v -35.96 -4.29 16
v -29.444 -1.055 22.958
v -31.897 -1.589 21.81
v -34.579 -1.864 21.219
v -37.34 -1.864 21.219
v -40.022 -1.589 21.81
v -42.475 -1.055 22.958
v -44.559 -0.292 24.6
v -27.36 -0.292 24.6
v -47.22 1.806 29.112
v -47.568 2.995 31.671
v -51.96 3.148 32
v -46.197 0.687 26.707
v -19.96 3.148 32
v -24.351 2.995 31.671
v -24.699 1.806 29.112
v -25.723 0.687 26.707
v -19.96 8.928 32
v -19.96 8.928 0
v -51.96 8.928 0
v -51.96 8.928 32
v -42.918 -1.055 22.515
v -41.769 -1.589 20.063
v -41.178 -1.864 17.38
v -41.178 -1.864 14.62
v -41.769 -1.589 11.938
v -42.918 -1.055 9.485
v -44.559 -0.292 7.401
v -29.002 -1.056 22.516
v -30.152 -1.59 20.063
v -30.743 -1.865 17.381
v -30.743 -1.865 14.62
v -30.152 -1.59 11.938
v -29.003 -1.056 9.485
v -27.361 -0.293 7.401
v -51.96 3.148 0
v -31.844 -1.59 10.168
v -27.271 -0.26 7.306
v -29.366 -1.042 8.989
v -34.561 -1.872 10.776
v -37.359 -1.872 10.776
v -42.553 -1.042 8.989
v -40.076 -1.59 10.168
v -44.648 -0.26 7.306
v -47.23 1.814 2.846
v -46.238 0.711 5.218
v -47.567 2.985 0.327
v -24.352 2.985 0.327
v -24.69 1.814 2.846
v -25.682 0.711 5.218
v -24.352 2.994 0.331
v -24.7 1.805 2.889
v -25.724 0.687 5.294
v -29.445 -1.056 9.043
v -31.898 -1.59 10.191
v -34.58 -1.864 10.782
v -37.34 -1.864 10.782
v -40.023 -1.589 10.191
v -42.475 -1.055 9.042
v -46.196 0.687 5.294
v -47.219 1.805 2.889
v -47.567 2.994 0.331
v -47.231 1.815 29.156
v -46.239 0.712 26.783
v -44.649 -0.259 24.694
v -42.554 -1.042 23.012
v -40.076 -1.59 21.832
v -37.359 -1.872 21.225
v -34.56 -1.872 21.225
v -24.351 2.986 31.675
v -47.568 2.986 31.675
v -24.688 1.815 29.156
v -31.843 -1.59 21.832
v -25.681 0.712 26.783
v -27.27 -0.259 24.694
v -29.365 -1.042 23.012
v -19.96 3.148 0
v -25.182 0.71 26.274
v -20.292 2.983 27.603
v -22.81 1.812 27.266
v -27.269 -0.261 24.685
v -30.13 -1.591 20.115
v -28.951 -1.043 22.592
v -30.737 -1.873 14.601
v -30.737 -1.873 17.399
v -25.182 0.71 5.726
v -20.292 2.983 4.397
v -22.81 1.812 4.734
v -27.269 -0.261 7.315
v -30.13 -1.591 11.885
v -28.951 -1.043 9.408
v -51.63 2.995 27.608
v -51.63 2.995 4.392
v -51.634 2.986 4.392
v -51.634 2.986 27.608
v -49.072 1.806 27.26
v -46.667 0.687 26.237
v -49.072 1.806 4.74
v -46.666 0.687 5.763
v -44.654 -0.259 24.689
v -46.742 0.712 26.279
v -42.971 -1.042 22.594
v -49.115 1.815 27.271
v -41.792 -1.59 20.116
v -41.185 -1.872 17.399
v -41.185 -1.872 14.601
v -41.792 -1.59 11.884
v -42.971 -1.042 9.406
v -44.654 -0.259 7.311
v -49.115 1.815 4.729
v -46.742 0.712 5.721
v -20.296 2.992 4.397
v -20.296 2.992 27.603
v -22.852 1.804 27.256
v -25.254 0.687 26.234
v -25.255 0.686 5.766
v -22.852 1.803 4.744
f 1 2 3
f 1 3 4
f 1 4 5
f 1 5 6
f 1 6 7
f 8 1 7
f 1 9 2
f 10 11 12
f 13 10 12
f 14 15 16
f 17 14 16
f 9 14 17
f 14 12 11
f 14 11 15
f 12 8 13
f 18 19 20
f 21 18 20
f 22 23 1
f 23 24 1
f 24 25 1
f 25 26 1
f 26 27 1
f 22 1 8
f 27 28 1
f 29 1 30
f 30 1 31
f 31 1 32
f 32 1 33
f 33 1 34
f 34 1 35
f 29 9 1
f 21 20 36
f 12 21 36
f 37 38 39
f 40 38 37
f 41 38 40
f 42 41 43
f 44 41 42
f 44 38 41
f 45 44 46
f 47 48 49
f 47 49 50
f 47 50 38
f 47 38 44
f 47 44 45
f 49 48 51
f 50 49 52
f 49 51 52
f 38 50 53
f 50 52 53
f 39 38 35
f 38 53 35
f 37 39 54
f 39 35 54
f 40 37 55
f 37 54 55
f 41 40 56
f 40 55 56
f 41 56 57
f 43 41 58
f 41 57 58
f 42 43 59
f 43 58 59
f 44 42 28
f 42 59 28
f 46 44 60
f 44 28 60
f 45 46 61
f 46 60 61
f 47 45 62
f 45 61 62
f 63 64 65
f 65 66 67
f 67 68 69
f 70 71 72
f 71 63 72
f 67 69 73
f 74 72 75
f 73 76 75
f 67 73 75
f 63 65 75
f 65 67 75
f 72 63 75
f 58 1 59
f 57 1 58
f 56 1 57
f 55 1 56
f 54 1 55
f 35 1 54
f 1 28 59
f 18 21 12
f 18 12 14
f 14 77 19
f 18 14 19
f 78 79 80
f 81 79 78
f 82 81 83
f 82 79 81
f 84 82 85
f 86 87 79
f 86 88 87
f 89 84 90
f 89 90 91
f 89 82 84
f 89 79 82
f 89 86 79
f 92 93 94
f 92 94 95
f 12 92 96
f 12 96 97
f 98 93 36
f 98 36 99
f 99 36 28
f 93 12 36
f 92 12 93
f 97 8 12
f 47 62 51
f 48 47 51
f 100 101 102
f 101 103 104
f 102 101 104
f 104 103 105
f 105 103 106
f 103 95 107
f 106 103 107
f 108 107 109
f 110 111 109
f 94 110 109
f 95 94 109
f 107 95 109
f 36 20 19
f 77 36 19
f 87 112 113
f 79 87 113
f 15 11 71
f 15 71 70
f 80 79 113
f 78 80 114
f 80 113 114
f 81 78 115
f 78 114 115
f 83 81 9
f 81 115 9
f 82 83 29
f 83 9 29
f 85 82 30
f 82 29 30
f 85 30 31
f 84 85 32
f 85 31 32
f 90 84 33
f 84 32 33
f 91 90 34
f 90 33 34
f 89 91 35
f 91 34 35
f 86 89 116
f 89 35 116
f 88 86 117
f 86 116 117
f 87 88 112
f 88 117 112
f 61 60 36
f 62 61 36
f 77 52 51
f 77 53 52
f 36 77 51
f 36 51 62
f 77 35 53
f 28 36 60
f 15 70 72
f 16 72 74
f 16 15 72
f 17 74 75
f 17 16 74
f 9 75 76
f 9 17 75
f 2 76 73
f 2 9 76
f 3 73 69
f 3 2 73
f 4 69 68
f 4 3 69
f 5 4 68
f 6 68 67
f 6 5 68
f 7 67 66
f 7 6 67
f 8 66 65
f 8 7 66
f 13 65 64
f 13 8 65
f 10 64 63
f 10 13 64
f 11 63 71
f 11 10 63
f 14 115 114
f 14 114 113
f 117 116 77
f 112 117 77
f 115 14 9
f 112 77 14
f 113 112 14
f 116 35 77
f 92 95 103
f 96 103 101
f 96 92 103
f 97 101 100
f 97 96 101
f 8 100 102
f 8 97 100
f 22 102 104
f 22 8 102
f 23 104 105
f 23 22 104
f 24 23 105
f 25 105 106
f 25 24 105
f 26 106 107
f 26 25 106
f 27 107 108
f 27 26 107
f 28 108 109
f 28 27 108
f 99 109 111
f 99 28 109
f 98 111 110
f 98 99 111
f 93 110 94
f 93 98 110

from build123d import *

# Parameters (mm, degrees)
SALIENTE_EXTRUIR1_DEPTH  = 32
CORTAR_EXTRUIR1_DEPTH    = 33
SALIENTE_EXTRUIR12_DEPTH = 0.01
SALIENTE_EXTRUIR13_DEPTH = 0.01
SALIENTE_EXTRUIR14_DEPTH = 0.01
SALIENTE_EXTRUIR15_DEPTH = 0.01


with BuildPart() as part:
    # Croquis1 → Saliente-Extruir1 (new body)
    with BuildSketch(Plane.XY):
        Polygon((-51.959662641, 8.927829358), (-51.959662641, 3.148169014), (-35.959662641, -4.290206314), (-19.959662641, 3.148169014), (-19.959662641, 8.927829358), align=None)
    extrude(amount=SALIENTE_EXTRUIR1_DEPTH)

    # Croquis2 → Cortar-Extruir1 (cut)
    with BuildSketch(Plane(origin=(-19.959662641, 0, 0), x_dir=(0, 0, -1), z_dir=(1, 0, 0))):
        Polygon((0, -4.290206314), (-16, -4.290206314), (0, 3.148169014), align=None)
        Polygon((-32, -4.290206314), (-32, 3.148169014), (-16, -4.290206314), align=None)
    extrude(amount=-CORTAR_EXTRUIR1_DEPTH, mode=Mode.SUBTRACT)

    # Croquis16 → Saliente-Extruir12 (add)
    with BuildSketch(Plane(origin=(0, -9.644179557, 4.483564205), x_dir=(-1, 0, 0), z_dir=(0, -0.906796627, 0.421568354))):
        with BuildLine():
            Line((47.568325111, -29.981567998), (36.071815605, -29.981567998))
            Line((36.071815605, -29.981567998), (24.351000171, -29.981567998))
            ThreePointArc((24.351000171, -29.981567998), (35.959662641, -18.372905528), (47.568325111, -29.981567998))
        make_face()
    extrude(amount=SALIENTE_EXTRUIR12_DEPTH)

    # Croquis17 → Saliente-Extruir13 (add)
    with BuildSketch(Plane(origin=(-8.030792992, -17.274294748, 0), x_dir=(-0.906796627, 0.421568354, 0), z_dir=(-0.421568354, -0.906796627, 0))):
        with BuildLine():
            Line((48.080668577, -16), (48.080668577, -27.608491723))
            ThreePointArc((48.080668577, -27.608491723), (36.472176853, -16), (48.080668577, -4.391508277))
            Line((48.080668577, -4.391508277), (48.080668577, -16))
        make_face()
    extrude(amount=SALIENTE_EXTRUIR13_DEPTH)

    # Croquis18 → Saliente-Extruir14 (add)
    with BuildSketch(Plane(origin=(0, 2.588676805, 1.203471855), x_dir=(-1, 0, 0), z_dir=(0, -0.906796627, -0.421568354))):
        with BuildLine():
            Line((47.567066817, 0.962202745), (35.959662641, 0.962202745))
            Line((35.959662641, 0.962202745), (24.352258465, 0.962202745))
            ThreePointArc((24.352258465, 0.962202745), (35.959662641, -10.64520143), (47.567066817, 0.962202745))
        make_face()
    extrude(amount=SALIENTE_EXTRUIR14_DEPTH)

    # Croquis19 → Saliente-Extruir15 (add)
    with BuildSketch(Plane(origin=(-4.750700642, 10.218791996, 0), x_dir=(-0.906796627, -0.421568354, 0), z_dir=(0.421568354, -0.906796627, 0))):
        with BuildLine():
            Line((17.142987404, -4.396515697), (17.142987404, -16))
            Line((17.142987404, -16), (17.142987404, -27.603484303))
            ThreePointArc((17.142987404, -27.603484303), (28.746471707, -16), (17.142987404, -4.396515697))
        make_face()
    extrude(amount=SALIENTE_EXTRUIR15_DEPTH)


solid = part.part
